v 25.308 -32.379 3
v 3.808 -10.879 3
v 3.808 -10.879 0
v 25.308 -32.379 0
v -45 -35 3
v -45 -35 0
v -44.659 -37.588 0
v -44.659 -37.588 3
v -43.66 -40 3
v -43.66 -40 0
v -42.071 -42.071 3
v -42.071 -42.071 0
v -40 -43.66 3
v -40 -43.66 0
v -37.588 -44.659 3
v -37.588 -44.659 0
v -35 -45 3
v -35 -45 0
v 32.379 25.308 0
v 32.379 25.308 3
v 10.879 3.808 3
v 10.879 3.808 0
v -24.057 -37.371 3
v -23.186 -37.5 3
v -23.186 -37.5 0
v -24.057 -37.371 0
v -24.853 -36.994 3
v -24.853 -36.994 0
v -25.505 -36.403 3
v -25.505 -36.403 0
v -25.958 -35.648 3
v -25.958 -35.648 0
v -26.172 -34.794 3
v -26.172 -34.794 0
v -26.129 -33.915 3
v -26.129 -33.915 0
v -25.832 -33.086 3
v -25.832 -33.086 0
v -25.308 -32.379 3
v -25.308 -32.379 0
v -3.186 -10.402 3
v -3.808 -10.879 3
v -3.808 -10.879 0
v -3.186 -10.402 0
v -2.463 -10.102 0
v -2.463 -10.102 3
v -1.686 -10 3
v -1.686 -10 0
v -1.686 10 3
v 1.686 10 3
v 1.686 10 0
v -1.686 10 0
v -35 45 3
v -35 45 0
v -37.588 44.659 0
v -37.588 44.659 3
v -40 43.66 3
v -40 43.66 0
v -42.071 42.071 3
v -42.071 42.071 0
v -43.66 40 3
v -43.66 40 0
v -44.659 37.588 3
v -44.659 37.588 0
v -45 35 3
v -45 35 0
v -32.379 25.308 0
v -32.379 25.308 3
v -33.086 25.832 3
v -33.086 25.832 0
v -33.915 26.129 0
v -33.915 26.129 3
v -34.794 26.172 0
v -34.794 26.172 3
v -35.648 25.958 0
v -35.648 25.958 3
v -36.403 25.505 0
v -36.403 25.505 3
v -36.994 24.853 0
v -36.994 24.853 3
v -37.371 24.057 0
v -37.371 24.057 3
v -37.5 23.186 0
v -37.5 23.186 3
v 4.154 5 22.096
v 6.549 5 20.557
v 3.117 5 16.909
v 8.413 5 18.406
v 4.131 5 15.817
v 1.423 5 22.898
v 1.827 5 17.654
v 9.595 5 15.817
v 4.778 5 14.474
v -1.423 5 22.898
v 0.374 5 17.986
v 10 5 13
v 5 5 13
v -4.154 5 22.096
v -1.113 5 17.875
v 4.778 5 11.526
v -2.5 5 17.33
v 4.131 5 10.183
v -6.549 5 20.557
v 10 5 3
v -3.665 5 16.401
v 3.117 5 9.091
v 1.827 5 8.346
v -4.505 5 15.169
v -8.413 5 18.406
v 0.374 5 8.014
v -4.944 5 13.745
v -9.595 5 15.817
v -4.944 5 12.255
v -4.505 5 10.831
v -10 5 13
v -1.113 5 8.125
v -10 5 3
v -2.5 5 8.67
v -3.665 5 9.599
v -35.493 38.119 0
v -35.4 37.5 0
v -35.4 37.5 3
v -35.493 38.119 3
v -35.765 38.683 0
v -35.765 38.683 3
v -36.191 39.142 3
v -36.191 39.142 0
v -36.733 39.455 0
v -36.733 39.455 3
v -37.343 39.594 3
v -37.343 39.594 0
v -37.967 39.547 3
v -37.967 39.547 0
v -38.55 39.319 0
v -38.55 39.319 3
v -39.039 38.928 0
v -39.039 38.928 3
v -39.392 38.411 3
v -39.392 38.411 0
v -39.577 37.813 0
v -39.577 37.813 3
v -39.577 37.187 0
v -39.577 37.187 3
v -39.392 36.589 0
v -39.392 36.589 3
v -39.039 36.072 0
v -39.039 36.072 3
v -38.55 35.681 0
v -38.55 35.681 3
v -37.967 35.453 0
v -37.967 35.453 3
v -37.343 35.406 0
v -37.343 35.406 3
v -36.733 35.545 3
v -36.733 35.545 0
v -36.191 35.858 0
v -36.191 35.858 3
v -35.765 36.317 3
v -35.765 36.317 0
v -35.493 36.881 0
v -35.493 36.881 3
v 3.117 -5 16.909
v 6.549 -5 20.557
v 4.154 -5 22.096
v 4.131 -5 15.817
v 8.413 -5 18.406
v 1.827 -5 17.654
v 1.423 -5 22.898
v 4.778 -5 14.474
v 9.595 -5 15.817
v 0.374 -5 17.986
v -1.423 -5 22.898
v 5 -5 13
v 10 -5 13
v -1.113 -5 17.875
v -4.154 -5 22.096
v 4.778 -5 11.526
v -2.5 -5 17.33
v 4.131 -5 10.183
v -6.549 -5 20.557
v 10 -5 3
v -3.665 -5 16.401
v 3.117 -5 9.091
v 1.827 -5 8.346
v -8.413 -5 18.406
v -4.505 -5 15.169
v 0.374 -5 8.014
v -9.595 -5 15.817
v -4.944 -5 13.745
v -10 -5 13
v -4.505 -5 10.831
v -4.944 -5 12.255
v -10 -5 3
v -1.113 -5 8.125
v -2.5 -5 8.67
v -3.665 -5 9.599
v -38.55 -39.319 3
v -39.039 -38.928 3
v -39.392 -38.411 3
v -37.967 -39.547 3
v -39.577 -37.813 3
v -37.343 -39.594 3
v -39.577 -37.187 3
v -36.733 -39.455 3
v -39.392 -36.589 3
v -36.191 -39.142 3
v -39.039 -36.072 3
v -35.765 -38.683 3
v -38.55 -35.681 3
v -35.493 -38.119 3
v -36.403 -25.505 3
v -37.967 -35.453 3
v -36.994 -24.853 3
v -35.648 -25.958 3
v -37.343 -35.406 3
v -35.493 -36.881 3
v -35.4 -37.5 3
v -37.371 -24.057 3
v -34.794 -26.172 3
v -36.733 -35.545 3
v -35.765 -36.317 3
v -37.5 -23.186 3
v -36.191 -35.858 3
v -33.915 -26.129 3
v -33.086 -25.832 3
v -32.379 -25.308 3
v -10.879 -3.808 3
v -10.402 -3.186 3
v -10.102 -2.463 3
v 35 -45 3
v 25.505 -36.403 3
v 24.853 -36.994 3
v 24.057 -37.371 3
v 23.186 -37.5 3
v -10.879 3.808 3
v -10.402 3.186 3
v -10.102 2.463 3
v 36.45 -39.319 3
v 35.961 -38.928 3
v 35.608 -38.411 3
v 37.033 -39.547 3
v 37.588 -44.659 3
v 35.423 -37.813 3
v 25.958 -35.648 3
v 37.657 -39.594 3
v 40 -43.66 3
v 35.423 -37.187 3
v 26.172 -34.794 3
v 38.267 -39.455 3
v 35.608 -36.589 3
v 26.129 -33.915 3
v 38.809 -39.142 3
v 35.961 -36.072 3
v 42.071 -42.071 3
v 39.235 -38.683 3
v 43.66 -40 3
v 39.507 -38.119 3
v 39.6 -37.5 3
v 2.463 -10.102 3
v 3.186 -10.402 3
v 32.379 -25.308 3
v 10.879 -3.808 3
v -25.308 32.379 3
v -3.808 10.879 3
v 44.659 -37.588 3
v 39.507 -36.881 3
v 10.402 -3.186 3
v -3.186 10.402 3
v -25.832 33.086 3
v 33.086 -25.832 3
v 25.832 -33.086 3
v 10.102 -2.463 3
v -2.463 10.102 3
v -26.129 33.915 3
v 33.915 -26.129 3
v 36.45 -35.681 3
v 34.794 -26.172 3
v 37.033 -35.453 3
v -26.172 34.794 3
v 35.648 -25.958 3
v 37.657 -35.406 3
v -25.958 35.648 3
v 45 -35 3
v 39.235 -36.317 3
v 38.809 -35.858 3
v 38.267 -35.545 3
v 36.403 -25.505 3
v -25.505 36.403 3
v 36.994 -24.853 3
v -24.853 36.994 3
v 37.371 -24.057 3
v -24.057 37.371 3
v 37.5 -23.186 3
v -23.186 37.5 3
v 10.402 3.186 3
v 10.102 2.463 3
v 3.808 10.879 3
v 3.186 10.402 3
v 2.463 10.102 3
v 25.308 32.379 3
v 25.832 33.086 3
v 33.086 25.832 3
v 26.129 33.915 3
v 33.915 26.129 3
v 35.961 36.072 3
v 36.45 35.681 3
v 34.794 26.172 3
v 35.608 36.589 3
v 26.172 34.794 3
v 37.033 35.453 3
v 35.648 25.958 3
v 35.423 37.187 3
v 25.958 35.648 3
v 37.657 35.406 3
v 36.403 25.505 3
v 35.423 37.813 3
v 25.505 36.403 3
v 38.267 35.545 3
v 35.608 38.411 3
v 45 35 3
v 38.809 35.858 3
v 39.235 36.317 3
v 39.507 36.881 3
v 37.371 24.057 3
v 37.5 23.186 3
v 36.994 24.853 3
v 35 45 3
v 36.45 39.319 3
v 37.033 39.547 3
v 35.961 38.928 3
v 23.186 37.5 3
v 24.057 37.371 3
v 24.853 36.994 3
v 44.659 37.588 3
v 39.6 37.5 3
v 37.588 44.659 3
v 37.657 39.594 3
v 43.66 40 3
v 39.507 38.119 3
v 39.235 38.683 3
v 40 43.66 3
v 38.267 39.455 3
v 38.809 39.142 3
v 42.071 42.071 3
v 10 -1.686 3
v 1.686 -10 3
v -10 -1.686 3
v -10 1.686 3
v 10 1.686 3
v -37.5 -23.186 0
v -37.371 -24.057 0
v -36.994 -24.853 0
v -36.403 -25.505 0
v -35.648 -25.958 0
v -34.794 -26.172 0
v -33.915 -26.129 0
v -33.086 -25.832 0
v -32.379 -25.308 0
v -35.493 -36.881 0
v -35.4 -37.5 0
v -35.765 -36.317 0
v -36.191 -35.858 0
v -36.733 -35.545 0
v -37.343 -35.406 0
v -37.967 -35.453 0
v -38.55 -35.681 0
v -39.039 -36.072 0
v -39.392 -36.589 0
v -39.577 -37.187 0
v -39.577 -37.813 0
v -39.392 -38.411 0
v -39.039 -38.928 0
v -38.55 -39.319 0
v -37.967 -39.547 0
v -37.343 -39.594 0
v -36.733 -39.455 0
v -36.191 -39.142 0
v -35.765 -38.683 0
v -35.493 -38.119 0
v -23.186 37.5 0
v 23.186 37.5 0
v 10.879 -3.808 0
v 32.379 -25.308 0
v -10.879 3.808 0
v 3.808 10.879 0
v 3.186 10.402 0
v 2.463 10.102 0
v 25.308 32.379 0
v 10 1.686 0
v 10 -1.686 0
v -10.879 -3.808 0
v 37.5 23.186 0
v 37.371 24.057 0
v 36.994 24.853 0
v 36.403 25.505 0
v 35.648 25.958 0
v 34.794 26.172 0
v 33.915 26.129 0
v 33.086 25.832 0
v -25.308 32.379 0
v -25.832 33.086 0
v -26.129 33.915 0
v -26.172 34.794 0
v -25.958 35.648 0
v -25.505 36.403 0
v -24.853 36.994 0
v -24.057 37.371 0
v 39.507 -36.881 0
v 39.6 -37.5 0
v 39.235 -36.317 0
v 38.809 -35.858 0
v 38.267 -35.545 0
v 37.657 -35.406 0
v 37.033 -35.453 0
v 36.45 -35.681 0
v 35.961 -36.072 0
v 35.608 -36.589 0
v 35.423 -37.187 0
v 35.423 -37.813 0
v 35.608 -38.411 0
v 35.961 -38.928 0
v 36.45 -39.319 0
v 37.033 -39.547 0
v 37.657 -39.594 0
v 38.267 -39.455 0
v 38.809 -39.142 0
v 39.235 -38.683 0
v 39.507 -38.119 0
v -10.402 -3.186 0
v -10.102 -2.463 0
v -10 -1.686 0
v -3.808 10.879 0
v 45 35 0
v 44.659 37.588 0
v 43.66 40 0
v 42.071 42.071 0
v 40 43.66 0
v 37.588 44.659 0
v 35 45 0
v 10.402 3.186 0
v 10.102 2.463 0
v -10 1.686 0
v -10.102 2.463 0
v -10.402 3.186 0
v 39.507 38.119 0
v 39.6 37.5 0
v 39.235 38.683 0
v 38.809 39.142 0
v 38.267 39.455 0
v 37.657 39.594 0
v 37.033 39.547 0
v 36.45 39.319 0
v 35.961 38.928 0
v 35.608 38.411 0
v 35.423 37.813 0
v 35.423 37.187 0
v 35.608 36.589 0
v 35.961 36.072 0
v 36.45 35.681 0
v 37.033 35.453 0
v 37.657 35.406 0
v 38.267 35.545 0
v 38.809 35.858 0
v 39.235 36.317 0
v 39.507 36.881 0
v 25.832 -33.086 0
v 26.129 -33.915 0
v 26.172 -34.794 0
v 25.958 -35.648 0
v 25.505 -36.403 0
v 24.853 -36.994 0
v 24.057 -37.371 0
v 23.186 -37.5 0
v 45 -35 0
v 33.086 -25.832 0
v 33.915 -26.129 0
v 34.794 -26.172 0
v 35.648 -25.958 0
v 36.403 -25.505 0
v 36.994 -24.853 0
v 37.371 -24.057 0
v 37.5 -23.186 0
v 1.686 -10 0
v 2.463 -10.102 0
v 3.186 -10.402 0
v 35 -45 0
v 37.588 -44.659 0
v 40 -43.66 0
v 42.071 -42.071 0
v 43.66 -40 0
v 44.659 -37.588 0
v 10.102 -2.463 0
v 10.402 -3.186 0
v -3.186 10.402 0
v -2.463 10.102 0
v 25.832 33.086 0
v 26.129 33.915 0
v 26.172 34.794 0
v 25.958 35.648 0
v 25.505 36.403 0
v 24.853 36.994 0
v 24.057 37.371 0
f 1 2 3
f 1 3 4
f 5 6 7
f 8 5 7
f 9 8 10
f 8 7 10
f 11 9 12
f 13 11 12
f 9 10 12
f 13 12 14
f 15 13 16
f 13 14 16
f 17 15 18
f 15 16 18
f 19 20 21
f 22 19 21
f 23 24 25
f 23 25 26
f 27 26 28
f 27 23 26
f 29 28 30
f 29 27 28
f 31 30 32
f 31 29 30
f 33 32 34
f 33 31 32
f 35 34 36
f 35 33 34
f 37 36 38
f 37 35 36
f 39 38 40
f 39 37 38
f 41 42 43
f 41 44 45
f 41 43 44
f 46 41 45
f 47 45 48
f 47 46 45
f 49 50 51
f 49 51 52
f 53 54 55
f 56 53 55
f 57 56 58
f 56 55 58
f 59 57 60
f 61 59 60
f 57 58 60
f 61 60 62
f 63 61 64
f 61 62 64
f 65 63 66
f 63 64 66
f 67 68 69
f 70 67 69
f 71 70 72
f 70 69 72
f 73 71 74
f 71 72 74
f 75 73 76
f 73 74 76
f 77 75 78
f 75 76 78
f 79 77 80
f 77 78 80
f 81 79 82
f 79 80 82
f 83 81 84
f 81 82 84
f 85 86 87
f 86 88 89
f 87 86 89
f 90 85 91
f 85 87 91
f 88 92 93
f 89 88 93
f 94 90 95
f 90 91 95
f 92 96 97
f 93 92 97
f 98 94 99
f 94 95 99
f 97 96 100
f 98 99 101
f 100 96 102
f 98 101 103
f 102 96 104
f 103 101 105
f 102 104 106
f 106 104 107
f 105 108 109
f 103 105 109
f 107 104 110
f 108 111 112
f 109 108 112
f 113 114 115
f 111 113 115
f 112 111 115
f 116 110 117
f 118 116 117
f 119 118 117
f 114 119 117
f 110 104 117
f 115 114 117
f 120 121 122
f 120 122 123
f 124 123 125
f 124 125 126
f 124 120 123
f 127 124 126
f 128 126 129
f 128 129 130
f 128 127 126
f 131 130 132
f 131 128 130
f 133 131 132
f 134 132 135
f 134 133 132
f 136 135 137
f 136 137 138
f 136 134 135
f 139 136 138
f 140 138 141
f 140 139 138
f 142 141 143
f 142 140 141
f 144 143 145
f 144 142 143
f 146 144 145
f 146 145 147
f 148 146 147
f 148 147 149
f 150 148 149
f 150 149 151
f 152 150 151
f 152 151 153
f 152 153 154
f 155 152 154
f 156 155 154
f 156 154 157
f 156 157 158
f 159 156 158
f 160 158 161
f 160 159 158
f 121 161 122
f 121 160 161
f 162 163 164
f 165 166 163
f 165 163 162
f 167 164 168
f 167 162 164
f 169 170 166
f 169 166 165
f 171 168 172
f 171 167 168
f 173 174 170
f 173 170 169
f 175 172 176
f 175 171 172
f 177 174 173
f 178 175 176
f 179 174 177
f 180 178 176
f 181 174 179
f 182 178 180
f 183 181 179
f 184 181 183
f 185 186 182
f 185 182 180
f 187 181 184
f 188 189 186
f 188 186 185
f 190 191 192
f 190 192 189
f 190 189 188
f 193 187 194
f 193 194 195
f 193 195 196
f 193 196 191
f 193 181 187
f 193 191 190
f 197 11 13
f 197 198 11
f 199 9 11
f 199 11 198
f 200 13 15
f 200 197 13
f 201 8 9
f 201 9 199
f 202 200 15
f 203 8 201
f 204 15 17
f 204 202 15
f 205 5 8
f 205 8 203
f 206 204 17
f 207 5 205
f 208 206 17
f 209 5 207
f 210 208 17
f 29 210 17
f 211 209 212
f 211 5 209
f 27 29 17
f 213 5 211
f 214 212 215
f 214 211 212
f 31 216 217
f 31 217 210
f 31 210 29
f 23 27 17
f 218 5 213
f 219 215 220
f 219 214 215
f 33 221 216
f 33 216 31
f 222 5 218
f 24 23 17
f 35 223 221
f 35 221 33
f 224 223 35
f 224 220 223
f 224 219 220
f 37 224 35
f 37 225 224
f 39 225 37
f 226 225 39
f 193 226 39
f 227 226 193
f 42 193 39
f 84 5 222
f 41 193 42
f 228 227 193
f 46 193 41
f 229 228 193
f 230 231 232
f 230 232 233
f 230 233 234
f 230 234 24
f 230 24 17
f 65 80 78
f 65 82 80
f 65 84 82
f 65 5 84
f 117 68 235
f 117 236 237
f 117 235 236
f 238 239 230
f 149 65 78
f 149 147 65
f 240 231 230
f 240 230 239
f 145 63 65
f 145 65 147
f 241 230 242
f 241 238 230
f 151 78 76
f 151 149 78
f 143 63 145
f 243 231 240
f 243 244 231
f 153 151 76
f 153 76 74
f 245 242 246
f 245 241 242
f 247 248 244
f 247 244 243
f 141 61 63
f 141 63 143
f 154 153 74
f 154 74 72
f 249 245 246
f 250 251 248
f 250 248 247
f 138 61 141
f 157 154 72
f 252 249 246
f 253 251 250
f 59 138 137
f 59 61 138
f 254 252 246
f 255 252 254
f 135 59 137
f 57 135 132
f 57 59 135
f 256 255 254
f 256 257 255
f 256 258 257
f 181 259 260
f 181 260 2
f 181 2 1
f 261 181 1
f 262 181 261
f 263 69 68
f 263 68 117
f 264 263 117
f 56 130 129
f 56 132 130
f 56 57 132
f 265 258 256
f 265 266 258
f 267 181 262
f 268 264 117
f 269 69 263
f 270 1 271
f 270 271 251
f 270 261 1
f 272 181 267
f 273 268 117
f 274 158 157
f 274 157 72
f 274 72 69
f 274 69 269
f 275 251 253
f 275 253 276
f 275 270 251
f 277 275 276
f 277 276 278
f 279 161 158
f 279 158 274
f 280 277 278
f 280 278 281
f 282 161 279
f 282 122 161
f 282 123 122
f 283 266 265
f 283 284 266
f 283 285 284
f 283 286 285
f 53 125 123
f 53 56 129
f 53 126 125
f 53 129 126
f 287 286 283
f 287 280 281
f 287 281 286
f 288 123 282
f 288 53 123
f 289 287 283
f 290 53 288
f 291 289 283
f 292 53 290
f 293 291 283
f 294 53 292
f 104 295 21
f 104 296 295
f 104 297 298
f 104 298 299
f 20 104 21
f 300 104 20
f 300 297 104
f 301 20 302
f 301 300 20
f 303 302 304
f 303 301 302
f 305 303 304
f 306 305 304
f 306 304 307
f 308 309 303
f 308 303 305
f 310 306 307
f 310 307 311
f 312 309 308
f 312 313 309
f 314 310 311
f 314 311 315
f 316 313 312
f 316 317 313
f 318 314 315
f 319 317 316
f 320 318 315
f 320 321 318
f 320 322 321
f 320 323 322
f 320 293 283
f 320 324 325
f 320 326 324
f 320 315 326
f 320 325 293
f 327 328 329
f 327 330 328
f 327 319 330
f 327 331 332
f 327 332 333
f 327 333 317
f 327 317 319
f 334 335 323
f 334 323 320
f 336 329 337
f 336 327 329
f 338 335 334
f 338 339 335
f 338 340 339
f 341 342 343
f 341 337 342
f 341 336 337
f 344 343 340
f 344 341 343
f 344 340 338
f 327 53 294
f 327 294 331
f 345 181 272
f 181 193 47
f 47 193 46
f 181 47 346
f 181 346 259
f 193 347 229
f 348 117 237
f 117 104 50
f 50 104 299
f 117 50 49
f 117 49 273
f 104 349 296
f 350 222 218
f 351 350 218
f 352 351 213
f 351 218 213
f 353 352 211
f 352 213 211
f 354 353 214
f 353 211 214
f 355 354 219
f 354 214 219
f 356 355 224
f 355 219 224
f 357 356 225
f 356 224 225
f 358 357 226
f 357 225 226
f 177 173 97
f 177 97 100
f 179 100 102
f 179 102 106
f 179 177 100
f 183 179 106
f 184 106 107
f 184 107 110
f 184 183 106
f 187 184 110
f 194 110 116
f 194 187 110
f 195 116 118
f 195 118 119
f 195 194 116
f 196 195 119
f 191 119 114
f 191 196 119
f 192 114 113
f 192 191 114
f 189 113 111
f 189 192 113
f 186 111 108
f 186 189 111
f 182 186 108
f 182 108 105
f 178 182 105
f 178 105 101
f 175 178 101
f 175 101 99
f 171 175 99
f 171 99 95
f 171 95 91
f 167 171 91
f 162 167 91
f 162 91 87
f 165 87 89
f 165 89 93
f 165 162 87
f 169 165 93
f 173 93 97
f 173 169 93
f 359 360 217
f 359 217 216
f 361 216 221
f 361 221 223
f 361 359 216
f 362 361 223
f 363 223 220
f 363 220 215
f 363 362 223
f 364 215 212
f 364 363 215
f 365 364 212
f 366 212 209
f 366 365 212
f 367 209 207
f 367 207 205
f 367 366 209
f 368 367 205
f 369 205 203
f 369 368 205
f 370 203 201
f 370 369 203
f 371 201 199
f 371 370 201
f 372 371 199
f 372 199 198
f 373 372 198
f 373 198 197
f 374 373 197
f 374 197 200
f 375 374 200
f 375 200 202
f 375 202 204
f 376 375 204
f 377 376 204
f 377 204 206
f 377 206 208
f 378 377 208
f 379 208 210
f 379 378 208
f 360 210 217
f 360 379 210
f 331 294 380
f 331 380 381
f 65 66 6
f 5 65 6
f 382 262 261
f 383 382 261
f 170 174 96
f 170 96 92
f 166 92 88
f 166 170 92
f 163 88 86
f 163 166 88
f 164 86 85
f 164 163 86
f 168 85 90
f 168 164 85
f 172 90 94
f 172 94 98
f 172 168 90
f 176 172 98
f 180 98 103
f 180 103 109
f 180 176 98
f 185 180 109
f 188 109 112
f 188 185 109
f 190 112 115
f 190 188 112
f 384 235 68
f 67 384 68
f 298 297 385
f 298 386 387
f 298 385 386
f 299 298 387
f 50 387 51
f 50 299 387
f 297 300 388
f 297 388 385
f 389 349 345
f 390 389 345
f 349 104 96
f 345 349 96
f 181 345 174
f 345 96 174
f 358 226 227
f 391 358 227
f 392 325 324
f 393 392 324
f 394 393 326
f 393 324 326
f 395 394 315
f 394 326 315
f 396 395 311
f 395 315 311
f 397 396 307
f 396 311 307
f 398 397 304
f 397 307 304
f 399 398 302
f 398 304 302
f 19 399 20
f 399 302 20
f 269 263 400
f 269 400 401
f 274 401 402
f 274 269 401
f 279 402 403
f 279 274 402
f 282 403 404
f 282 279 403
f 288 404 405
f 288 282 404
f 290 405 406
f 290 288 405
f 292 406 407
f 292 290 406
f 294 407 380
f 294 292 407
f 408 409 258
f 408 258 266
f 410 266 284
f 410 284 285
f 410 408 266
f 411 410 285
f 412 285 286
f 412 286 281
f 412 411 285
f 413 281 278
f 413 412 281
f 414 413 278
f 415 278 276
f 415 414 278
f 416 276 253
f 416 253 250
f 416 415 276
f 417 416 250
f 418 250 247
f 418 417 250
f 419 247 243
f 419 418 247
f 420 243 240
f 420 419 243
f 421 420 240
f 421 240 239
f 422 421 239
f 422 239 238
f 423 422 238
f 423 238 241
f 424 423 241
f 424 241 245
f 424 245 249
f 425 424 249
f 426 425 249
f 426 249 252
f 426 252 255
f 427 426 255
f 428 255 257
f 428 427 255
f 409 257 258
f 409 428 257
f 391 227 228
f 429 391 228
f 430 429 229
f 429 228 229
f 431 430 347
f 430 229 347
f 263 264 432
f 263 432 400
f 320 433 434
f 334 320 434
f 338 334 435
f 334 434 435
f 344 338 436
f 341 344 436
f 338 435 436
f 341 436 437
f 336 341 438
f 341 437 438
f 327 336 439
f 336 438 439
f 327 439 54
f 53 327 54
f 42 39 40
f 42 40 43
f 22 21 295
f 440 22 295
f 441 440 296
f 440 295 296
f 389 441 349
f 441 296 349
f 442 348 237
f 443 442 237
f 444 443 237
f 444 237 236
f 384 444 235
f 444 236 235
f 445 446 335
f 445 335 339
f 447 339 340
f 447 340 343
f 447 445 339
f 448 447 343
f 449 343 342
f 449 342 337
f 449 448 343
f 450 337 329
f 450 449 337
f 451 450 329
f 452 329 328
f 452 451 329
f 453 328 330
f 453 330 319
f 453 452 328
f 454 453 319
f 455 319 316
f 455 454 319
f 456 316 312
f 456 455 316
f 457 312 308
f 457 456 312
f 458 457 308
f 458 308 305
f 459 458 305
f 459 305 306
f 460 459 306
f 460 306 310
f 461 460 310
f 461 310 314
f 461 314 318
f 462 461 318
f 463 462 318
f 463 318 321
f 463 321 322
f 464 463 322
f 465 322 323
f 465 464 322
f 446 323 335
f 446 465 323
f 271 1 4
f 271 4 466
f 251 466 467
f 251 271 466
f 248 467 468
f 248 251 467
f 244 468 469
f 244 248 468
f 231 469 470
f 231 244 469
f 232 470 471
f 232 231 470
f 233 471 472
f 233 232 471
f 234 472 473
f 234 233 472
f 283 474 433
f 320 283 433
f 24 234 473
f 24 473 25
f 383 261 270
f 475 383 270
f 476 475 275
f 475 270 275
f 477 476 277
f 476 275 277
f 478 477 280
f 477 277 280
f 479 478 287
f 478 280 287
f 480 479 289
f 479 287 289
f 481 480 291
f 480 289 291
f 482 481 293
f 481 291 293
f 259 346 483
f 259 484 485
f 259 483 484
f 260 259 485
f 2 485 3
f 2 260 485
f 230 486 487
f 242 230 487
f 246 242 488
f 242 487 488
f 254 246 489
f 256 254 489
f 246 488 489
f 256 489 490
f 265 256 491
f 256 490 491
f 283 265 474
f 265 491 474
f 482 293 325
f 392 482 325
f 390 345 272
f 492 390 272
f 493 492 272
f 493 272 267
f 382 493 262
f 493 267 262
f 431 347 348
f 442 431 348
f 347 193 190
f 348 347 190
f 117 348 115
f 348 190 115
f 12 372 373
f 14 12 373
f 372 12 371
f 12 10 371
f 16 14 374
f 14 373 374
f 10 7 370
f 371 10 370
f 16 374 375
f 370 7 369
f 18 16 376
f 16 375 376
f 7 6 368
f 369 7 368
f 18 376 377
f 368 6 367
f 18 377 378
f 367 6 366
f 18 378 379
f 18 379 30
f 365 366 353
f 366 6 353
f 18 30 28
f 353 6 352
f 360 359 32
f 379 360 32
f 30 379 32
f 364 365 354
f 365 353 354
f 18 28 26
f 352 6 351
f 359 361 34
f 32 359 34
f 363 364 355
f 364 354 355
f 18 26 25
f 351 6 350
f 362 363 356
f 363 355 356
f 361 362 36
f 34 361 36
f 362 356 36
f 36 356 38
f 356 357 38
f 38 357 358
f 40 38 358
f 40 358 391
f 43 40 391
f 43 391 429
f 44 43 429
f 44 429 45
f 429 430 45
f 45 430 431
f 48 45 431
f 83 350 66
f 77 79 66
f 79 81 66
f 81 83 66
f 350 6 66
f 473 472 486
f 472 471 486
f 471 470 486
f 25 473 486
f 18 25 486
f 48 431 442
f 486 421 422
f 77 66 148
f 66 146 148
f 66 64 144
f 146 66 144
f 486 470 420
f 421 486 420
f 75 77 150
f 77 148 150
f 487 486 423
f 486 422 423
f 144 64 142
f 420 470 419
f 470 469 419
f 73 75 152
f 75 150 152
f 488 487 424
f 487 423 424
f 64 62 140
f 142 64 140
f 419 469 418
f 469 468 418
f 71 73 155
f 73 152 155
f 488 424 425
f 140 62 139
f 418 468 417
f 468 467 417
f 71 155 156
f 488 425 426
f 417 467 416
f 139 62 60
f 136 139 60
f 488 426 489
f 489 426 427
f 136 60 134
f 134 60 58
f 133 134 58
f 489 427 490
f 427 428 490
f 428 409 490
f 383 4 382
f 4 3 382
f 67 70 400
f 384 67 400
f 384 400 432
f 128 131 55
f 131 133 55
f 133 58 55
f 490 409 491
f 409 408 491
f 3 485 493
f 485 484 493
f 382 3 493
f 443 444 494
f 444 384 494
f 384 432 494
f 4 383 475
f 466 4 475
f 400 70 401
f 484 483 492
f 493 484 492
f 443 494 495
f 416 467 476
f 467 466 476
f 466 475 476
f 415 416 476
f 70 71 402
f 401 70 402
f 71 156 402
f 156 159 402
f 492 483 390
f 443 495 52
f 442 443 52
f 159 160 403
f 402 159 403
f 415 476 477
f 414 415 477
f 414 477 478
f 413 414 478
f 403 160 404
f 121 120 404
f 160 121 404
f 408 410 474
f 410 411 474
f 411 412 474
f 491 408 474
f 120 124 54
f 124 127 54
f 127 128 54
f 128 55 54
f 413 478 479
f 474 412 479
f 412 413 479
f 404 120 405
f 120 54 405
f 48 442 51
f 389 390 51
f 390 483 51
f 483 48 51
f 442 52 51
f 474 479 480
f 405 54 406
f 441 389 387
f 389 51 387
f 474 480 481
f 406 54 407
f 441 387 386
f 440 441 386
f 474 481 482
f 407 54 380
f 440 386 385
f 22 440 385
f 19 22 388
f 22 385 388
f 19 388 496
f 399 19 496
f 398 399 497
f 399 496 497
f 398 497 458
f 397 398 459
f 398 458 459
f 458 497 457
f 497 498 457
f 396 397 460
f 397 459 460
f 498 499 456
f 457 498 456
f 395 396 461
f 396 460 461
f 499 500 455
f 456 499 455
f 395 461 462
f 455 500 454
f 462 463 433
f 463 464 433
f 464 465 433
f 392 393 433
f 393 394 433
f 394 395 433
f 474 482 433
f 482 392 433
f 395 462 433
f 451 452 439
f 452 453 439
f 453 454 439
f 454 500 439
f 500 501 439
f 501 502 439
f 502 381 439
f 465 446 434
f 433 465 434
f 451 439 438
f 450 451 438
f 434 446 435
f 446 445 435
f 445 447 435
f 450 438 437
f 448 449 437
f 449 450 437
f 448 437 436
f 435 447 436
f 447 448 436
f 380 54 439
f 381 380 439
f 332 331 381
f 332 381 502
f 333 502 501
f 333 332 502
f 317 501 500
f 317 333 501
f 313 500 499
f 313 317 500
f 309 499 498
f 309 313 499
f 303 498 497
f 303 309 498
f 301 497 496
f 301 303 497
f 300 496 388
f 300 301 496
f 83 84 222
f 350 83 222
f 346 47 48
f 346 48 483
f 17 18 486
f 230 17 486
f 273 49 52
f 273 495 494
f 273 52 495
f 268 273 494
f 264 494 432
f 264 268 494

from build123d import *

# Parameters (mm, degrees)
ESQUISSE1_R             = 2.1
BOSS_EXTRU_1_DEPTH      = 3
BOSS_EXTRU_2_START      = -50
ESQUISSE4_R             = 5
BOSS_EXTRU_2_DEPTH      = 10
ENL_V_MAT_EXTRU_1_DEPTH = 10


with BuildPart() as part:
    # Esquisse1 → Boss.-Extru.1 (new body)
    with BuildSketch(Plane.XY):
        with BuildLine():
            Line((-35, -45), (35, -45))
            ThreePointArc((35, -45), (42.071067812, -42.071067812), (45, -35))
            Line((45, -35), (45, 35))
            ThreePointArc((45, 35), (42.071067812, 42.071067812), (35, 45))
            Line((35, 45), (-35, 45))
            ThreePointArc((-35, 45), (-42.071067812, 42.071067812), (-45, 35))
            Line((-45, 35), (-45, -35))
            ThreePointArc((-45, -35), (-42.071067812, -42.071067812), (-35, -45))
        make_face()
        with Locations((-37.5, 37.5)):
            Circle(ESQUISSE1_R, mode=Mode.SUBTRACT)
        with Locations((37.5, 37.5)):
            Circle(ESQUISSE1_R, mode=Mode.SUBTRACT)
        with Locations((37.5, -37.5)):
            Circle(ESQUISSE1_R, mode=Mode.SUBTRACT)
        with Locations((-37.5, -37.5)):
            Circle(ESQUISSE1_R, mode=Mode.SUBTRACT)
    extrude(amount=BOSS_EXTRU_1_DEPTH)

    # Esquisse4 → Boss.-Extru.2 (add)
    with BuildSketch(Plane(origin=(0, 45, 123.316242038), x_dir=(1, 0, 0), z_dir=(0, 1, 0)).offset(BOSS_EXTRU_2_START)):
        with BuildLine():
            Line((10, 120.316242038), (10, 110.316242038))
            ThreePointArc((10, 110.316242038), (0, 100.316242038), (-10, 110.316242038))
            Line((-10, 110.316242038), (-10, 120.316242038))
            Line((-10, 120.316242038), (10, 120.316242038))
        make_face()
        with Locations((0, 110.316242038)):
            Circle(ESQUISSE4_R, mode=Mode.SUBTRACT)
    extrude(amount=BOSS_EXTRU_2_DEPTH)

    # Esquisse5 → Enlèv. mat.-Extru.1 (cut)
    with BuildSketch(Plane.XY.offset(3)):
        with BuildLine():
            Line((-23.186291501, 37.5), (23.186291501, 37.5))
            ThreePointArc((23.186291501, 37.5), (25.957930099, 35.648050297), (25.307611845, 32.378679656))
            Line((25.307611845, 32.378679656), (3.807611845, 10.878679656))
            ThreePointArc((3.807611845, 10.878679656), (2.834341798, 10.228361402), (1.686291501, 10))
            Line((1.686291501, 10), (-1.686291501, 10))
            ThreePointArc((-1.686291501, 10), (-2.834341798, 10.228361402), (-3.807611845, 10.878679656))
            Line((-3.807611845, 10.878679656), (-25.307611845, 32.378679656))
            ThreePointArc((-25.307611845, 32.378679656), (-25.957930099, 35.648050297), (-23.186291501, 37.5))
        make_face()
        with BuildLine():
            Line((-32.378679656, -25.307611845), (-10.878679656, -3.807611845))
            ThreePointArc((-10.878679656, -3.807611845), (-10.228361402, -2.834341798), (-10, -1.686291501))
            Line((-10, -1.686291501), (-10, 1.686291501))
            ThreePointArc((-10, 1.686291501), (-10.228361402, 2.834341798), (-10.878679656, 3.807611845))
            Line((-10.878679656, 3.807611845), (-32.378679656, 25.307611845))
            ThreePointArc((-32.378679656, 25.307611845), (-35.648050297, 25.957930099), (-37.5, 23.186291501))
            Line((-37.5, 23.186291501), (-37.5, -23.186291501))
            ThreePointArc((-37.5, -23.186291501), (-35.648050297, -25.957930099), (-32.378679656, -25.307611845))
        make_face()
        with BuildLine():
            Line((32.378679656, 25.307611845), (10.878679656, 3.807611845))
            ThreePointArc((10.878679656, 3.807611845), (10.228361402, 2.834341798), (10, 1.686291501))
            Line((10, 1.686291501), (10, -1.686291501))
            ThreePointArc((10, -1.686291501), (10.228361402, -2.834341798), (10.878679656, -3.807611845))
            Line((10.878679656, -3.807611845), (32.378679656, -25.307611845))
            ThreePointArc((32.378679656, -25.307611845), (35.648050297, -25.957930099), (37.5, -23.186291501))
            Line((37.5, -23.186291501), (37.5, 23.186291501))
            ThreePointArc((37.5, 23.186291501), (35.648050297, 25.957930099), (32.378679656, 25.307611845))
        make_face()
        with BuildLine():
            Line((23.186291501, -37.5), (-23.186291501, -37.5))
            ThreePointArc((-23.186291501, -37.5), (-25.957930099, -35.648050297), (-25.307611845, -32.378679656))
            Line((-25.307611845, -32.378679656), (-3.807611845, -10.878679656))
            ThreePointArc((-3.807611845, -10.878679656), (-2.834341798, -10.228361402), (-1.686291501, -10))
            Line((-1.686291501, -10), (1.686291501, -10))
            ThreePointArc((1.686291501, -10), (2.834341798, -10.228361402), (3.807611845, -10.878679656))
            Line((3.807611845, -10.878679656), (25.307611845, -32.378679656))
            ThreePointArc((25.307611845, -32.378679656), (25.957930099, -35.648050297), (23.186291501, -37.5))
        make_face()
    extrude(amount=-ENL_V_MAT_EXTRU_1_DEPTH, mode=Mode.SUBTRACT)


solid = part.part
